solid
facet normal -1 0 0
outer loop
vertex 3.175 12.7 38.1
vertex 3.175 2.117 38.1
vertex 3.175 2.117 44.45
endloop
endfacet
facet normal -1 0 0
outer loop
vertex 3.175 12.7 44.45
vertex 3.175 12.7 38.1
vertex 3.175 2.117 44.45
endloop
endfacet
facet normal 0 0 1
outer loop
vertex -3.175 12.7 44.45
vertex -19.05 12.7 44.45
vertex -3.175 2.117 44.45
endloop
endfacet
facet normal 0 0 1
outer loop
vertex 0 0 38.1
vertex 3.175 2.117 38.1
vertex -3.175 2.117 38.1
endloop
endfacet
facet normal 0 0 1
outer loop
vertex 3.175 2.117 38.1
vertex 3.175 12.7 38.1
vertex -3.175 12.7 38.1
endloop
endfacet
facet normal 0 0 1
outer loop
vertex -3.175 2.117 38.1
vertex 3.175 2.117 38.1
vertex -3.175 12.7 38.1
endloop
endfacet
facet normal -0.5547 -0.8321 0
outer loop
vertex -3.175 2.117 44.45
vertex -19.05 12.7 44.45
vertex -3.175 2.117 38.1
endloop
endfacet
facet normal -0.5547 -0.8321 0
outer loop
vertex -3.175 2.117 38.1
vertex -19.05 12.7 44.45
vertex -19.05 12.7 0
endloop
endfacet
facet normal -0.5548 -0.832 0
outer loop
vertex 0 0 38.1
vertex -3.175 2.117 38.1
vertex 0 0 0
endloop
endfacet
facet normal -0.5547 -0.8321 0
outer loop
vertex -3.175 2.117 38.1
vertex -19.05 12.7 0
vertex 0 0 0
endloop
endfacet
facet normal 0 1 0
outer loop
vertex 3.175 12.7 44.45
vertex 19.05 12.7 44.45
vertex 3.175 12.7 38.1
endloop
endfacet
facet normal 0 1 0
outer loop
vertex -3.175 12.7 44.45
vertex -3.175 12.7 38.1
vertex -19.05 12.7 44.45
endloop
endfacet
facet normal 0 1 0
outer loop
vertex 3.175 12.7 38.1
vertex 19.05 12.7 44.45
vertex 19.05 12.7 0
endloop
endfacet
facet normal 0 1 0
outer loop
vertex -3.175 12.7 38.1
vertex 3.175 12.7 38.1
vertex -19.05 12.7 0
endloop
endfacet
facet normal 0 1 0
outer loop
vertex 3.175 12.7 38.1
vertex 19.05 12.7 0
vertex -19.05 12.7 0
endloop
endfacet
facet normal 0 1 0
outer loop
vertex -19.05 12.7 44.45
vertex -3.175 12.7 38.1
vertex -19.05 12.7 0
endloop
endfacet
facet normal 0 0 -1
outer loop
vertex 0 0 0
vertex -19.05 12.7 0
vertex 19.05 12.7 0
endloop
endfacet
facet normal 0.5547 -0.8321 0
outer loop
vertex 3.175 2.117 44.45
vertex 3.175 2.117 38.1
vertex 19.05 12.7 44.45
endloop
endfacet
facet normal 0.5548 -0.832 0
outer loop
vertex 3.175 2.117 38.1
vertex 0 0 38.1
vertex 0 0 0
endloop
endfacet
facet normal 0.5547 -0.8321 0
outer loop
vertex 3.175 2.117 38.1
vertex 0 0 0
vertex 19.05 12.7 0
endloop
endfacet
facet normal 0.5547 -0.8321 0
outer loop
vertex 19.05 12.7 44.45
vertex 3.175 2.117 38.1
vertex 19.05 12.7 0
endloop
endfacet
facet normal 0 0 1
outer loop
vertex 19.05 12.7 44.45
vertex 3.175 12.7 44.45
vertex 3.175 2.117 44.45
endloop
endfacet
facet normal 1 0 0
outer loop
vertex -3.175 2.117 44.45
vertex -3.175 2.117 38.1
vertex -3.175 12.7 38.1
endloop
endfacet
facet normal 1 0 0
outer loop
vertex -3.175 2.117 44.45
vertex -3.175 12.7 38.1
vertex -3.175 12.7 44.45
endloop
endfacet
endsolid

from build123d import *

# Parameters (mm, degrees)
F1_DEPTH = 44.45
F2_W     = 6.35
F2_H     = 6.35
F3_DEPTH = 25.4


with BuildPart() as f1:
    # F0 (on Top) → F1 (new body)
    with BuildSketch(Plane.XY):
        Polygon((-19.05, 12.7), (0, 0), (0, 12.7), (-12.7, 12.7), align=None)
        Polygon((0, 12.7), (0, 0), (19.05, 12.7), (12.7, 12.7), align=None)
    extrude(amount=F1_DEPTH)

    # F2 (on face) → F3 (cut)
    with BuildSketch(Plane(origin=(0, 12.7, 0), x_dir=(-1, 0, 0), z_dir=(0, 1, 0))):
        with Locations((0, 41.275)):
            Rectangle(F2_W, F2_H)
    extrude(amount=-F3_DEPTH, mode=Mode.SUBTRACT)


solid = f1.part
